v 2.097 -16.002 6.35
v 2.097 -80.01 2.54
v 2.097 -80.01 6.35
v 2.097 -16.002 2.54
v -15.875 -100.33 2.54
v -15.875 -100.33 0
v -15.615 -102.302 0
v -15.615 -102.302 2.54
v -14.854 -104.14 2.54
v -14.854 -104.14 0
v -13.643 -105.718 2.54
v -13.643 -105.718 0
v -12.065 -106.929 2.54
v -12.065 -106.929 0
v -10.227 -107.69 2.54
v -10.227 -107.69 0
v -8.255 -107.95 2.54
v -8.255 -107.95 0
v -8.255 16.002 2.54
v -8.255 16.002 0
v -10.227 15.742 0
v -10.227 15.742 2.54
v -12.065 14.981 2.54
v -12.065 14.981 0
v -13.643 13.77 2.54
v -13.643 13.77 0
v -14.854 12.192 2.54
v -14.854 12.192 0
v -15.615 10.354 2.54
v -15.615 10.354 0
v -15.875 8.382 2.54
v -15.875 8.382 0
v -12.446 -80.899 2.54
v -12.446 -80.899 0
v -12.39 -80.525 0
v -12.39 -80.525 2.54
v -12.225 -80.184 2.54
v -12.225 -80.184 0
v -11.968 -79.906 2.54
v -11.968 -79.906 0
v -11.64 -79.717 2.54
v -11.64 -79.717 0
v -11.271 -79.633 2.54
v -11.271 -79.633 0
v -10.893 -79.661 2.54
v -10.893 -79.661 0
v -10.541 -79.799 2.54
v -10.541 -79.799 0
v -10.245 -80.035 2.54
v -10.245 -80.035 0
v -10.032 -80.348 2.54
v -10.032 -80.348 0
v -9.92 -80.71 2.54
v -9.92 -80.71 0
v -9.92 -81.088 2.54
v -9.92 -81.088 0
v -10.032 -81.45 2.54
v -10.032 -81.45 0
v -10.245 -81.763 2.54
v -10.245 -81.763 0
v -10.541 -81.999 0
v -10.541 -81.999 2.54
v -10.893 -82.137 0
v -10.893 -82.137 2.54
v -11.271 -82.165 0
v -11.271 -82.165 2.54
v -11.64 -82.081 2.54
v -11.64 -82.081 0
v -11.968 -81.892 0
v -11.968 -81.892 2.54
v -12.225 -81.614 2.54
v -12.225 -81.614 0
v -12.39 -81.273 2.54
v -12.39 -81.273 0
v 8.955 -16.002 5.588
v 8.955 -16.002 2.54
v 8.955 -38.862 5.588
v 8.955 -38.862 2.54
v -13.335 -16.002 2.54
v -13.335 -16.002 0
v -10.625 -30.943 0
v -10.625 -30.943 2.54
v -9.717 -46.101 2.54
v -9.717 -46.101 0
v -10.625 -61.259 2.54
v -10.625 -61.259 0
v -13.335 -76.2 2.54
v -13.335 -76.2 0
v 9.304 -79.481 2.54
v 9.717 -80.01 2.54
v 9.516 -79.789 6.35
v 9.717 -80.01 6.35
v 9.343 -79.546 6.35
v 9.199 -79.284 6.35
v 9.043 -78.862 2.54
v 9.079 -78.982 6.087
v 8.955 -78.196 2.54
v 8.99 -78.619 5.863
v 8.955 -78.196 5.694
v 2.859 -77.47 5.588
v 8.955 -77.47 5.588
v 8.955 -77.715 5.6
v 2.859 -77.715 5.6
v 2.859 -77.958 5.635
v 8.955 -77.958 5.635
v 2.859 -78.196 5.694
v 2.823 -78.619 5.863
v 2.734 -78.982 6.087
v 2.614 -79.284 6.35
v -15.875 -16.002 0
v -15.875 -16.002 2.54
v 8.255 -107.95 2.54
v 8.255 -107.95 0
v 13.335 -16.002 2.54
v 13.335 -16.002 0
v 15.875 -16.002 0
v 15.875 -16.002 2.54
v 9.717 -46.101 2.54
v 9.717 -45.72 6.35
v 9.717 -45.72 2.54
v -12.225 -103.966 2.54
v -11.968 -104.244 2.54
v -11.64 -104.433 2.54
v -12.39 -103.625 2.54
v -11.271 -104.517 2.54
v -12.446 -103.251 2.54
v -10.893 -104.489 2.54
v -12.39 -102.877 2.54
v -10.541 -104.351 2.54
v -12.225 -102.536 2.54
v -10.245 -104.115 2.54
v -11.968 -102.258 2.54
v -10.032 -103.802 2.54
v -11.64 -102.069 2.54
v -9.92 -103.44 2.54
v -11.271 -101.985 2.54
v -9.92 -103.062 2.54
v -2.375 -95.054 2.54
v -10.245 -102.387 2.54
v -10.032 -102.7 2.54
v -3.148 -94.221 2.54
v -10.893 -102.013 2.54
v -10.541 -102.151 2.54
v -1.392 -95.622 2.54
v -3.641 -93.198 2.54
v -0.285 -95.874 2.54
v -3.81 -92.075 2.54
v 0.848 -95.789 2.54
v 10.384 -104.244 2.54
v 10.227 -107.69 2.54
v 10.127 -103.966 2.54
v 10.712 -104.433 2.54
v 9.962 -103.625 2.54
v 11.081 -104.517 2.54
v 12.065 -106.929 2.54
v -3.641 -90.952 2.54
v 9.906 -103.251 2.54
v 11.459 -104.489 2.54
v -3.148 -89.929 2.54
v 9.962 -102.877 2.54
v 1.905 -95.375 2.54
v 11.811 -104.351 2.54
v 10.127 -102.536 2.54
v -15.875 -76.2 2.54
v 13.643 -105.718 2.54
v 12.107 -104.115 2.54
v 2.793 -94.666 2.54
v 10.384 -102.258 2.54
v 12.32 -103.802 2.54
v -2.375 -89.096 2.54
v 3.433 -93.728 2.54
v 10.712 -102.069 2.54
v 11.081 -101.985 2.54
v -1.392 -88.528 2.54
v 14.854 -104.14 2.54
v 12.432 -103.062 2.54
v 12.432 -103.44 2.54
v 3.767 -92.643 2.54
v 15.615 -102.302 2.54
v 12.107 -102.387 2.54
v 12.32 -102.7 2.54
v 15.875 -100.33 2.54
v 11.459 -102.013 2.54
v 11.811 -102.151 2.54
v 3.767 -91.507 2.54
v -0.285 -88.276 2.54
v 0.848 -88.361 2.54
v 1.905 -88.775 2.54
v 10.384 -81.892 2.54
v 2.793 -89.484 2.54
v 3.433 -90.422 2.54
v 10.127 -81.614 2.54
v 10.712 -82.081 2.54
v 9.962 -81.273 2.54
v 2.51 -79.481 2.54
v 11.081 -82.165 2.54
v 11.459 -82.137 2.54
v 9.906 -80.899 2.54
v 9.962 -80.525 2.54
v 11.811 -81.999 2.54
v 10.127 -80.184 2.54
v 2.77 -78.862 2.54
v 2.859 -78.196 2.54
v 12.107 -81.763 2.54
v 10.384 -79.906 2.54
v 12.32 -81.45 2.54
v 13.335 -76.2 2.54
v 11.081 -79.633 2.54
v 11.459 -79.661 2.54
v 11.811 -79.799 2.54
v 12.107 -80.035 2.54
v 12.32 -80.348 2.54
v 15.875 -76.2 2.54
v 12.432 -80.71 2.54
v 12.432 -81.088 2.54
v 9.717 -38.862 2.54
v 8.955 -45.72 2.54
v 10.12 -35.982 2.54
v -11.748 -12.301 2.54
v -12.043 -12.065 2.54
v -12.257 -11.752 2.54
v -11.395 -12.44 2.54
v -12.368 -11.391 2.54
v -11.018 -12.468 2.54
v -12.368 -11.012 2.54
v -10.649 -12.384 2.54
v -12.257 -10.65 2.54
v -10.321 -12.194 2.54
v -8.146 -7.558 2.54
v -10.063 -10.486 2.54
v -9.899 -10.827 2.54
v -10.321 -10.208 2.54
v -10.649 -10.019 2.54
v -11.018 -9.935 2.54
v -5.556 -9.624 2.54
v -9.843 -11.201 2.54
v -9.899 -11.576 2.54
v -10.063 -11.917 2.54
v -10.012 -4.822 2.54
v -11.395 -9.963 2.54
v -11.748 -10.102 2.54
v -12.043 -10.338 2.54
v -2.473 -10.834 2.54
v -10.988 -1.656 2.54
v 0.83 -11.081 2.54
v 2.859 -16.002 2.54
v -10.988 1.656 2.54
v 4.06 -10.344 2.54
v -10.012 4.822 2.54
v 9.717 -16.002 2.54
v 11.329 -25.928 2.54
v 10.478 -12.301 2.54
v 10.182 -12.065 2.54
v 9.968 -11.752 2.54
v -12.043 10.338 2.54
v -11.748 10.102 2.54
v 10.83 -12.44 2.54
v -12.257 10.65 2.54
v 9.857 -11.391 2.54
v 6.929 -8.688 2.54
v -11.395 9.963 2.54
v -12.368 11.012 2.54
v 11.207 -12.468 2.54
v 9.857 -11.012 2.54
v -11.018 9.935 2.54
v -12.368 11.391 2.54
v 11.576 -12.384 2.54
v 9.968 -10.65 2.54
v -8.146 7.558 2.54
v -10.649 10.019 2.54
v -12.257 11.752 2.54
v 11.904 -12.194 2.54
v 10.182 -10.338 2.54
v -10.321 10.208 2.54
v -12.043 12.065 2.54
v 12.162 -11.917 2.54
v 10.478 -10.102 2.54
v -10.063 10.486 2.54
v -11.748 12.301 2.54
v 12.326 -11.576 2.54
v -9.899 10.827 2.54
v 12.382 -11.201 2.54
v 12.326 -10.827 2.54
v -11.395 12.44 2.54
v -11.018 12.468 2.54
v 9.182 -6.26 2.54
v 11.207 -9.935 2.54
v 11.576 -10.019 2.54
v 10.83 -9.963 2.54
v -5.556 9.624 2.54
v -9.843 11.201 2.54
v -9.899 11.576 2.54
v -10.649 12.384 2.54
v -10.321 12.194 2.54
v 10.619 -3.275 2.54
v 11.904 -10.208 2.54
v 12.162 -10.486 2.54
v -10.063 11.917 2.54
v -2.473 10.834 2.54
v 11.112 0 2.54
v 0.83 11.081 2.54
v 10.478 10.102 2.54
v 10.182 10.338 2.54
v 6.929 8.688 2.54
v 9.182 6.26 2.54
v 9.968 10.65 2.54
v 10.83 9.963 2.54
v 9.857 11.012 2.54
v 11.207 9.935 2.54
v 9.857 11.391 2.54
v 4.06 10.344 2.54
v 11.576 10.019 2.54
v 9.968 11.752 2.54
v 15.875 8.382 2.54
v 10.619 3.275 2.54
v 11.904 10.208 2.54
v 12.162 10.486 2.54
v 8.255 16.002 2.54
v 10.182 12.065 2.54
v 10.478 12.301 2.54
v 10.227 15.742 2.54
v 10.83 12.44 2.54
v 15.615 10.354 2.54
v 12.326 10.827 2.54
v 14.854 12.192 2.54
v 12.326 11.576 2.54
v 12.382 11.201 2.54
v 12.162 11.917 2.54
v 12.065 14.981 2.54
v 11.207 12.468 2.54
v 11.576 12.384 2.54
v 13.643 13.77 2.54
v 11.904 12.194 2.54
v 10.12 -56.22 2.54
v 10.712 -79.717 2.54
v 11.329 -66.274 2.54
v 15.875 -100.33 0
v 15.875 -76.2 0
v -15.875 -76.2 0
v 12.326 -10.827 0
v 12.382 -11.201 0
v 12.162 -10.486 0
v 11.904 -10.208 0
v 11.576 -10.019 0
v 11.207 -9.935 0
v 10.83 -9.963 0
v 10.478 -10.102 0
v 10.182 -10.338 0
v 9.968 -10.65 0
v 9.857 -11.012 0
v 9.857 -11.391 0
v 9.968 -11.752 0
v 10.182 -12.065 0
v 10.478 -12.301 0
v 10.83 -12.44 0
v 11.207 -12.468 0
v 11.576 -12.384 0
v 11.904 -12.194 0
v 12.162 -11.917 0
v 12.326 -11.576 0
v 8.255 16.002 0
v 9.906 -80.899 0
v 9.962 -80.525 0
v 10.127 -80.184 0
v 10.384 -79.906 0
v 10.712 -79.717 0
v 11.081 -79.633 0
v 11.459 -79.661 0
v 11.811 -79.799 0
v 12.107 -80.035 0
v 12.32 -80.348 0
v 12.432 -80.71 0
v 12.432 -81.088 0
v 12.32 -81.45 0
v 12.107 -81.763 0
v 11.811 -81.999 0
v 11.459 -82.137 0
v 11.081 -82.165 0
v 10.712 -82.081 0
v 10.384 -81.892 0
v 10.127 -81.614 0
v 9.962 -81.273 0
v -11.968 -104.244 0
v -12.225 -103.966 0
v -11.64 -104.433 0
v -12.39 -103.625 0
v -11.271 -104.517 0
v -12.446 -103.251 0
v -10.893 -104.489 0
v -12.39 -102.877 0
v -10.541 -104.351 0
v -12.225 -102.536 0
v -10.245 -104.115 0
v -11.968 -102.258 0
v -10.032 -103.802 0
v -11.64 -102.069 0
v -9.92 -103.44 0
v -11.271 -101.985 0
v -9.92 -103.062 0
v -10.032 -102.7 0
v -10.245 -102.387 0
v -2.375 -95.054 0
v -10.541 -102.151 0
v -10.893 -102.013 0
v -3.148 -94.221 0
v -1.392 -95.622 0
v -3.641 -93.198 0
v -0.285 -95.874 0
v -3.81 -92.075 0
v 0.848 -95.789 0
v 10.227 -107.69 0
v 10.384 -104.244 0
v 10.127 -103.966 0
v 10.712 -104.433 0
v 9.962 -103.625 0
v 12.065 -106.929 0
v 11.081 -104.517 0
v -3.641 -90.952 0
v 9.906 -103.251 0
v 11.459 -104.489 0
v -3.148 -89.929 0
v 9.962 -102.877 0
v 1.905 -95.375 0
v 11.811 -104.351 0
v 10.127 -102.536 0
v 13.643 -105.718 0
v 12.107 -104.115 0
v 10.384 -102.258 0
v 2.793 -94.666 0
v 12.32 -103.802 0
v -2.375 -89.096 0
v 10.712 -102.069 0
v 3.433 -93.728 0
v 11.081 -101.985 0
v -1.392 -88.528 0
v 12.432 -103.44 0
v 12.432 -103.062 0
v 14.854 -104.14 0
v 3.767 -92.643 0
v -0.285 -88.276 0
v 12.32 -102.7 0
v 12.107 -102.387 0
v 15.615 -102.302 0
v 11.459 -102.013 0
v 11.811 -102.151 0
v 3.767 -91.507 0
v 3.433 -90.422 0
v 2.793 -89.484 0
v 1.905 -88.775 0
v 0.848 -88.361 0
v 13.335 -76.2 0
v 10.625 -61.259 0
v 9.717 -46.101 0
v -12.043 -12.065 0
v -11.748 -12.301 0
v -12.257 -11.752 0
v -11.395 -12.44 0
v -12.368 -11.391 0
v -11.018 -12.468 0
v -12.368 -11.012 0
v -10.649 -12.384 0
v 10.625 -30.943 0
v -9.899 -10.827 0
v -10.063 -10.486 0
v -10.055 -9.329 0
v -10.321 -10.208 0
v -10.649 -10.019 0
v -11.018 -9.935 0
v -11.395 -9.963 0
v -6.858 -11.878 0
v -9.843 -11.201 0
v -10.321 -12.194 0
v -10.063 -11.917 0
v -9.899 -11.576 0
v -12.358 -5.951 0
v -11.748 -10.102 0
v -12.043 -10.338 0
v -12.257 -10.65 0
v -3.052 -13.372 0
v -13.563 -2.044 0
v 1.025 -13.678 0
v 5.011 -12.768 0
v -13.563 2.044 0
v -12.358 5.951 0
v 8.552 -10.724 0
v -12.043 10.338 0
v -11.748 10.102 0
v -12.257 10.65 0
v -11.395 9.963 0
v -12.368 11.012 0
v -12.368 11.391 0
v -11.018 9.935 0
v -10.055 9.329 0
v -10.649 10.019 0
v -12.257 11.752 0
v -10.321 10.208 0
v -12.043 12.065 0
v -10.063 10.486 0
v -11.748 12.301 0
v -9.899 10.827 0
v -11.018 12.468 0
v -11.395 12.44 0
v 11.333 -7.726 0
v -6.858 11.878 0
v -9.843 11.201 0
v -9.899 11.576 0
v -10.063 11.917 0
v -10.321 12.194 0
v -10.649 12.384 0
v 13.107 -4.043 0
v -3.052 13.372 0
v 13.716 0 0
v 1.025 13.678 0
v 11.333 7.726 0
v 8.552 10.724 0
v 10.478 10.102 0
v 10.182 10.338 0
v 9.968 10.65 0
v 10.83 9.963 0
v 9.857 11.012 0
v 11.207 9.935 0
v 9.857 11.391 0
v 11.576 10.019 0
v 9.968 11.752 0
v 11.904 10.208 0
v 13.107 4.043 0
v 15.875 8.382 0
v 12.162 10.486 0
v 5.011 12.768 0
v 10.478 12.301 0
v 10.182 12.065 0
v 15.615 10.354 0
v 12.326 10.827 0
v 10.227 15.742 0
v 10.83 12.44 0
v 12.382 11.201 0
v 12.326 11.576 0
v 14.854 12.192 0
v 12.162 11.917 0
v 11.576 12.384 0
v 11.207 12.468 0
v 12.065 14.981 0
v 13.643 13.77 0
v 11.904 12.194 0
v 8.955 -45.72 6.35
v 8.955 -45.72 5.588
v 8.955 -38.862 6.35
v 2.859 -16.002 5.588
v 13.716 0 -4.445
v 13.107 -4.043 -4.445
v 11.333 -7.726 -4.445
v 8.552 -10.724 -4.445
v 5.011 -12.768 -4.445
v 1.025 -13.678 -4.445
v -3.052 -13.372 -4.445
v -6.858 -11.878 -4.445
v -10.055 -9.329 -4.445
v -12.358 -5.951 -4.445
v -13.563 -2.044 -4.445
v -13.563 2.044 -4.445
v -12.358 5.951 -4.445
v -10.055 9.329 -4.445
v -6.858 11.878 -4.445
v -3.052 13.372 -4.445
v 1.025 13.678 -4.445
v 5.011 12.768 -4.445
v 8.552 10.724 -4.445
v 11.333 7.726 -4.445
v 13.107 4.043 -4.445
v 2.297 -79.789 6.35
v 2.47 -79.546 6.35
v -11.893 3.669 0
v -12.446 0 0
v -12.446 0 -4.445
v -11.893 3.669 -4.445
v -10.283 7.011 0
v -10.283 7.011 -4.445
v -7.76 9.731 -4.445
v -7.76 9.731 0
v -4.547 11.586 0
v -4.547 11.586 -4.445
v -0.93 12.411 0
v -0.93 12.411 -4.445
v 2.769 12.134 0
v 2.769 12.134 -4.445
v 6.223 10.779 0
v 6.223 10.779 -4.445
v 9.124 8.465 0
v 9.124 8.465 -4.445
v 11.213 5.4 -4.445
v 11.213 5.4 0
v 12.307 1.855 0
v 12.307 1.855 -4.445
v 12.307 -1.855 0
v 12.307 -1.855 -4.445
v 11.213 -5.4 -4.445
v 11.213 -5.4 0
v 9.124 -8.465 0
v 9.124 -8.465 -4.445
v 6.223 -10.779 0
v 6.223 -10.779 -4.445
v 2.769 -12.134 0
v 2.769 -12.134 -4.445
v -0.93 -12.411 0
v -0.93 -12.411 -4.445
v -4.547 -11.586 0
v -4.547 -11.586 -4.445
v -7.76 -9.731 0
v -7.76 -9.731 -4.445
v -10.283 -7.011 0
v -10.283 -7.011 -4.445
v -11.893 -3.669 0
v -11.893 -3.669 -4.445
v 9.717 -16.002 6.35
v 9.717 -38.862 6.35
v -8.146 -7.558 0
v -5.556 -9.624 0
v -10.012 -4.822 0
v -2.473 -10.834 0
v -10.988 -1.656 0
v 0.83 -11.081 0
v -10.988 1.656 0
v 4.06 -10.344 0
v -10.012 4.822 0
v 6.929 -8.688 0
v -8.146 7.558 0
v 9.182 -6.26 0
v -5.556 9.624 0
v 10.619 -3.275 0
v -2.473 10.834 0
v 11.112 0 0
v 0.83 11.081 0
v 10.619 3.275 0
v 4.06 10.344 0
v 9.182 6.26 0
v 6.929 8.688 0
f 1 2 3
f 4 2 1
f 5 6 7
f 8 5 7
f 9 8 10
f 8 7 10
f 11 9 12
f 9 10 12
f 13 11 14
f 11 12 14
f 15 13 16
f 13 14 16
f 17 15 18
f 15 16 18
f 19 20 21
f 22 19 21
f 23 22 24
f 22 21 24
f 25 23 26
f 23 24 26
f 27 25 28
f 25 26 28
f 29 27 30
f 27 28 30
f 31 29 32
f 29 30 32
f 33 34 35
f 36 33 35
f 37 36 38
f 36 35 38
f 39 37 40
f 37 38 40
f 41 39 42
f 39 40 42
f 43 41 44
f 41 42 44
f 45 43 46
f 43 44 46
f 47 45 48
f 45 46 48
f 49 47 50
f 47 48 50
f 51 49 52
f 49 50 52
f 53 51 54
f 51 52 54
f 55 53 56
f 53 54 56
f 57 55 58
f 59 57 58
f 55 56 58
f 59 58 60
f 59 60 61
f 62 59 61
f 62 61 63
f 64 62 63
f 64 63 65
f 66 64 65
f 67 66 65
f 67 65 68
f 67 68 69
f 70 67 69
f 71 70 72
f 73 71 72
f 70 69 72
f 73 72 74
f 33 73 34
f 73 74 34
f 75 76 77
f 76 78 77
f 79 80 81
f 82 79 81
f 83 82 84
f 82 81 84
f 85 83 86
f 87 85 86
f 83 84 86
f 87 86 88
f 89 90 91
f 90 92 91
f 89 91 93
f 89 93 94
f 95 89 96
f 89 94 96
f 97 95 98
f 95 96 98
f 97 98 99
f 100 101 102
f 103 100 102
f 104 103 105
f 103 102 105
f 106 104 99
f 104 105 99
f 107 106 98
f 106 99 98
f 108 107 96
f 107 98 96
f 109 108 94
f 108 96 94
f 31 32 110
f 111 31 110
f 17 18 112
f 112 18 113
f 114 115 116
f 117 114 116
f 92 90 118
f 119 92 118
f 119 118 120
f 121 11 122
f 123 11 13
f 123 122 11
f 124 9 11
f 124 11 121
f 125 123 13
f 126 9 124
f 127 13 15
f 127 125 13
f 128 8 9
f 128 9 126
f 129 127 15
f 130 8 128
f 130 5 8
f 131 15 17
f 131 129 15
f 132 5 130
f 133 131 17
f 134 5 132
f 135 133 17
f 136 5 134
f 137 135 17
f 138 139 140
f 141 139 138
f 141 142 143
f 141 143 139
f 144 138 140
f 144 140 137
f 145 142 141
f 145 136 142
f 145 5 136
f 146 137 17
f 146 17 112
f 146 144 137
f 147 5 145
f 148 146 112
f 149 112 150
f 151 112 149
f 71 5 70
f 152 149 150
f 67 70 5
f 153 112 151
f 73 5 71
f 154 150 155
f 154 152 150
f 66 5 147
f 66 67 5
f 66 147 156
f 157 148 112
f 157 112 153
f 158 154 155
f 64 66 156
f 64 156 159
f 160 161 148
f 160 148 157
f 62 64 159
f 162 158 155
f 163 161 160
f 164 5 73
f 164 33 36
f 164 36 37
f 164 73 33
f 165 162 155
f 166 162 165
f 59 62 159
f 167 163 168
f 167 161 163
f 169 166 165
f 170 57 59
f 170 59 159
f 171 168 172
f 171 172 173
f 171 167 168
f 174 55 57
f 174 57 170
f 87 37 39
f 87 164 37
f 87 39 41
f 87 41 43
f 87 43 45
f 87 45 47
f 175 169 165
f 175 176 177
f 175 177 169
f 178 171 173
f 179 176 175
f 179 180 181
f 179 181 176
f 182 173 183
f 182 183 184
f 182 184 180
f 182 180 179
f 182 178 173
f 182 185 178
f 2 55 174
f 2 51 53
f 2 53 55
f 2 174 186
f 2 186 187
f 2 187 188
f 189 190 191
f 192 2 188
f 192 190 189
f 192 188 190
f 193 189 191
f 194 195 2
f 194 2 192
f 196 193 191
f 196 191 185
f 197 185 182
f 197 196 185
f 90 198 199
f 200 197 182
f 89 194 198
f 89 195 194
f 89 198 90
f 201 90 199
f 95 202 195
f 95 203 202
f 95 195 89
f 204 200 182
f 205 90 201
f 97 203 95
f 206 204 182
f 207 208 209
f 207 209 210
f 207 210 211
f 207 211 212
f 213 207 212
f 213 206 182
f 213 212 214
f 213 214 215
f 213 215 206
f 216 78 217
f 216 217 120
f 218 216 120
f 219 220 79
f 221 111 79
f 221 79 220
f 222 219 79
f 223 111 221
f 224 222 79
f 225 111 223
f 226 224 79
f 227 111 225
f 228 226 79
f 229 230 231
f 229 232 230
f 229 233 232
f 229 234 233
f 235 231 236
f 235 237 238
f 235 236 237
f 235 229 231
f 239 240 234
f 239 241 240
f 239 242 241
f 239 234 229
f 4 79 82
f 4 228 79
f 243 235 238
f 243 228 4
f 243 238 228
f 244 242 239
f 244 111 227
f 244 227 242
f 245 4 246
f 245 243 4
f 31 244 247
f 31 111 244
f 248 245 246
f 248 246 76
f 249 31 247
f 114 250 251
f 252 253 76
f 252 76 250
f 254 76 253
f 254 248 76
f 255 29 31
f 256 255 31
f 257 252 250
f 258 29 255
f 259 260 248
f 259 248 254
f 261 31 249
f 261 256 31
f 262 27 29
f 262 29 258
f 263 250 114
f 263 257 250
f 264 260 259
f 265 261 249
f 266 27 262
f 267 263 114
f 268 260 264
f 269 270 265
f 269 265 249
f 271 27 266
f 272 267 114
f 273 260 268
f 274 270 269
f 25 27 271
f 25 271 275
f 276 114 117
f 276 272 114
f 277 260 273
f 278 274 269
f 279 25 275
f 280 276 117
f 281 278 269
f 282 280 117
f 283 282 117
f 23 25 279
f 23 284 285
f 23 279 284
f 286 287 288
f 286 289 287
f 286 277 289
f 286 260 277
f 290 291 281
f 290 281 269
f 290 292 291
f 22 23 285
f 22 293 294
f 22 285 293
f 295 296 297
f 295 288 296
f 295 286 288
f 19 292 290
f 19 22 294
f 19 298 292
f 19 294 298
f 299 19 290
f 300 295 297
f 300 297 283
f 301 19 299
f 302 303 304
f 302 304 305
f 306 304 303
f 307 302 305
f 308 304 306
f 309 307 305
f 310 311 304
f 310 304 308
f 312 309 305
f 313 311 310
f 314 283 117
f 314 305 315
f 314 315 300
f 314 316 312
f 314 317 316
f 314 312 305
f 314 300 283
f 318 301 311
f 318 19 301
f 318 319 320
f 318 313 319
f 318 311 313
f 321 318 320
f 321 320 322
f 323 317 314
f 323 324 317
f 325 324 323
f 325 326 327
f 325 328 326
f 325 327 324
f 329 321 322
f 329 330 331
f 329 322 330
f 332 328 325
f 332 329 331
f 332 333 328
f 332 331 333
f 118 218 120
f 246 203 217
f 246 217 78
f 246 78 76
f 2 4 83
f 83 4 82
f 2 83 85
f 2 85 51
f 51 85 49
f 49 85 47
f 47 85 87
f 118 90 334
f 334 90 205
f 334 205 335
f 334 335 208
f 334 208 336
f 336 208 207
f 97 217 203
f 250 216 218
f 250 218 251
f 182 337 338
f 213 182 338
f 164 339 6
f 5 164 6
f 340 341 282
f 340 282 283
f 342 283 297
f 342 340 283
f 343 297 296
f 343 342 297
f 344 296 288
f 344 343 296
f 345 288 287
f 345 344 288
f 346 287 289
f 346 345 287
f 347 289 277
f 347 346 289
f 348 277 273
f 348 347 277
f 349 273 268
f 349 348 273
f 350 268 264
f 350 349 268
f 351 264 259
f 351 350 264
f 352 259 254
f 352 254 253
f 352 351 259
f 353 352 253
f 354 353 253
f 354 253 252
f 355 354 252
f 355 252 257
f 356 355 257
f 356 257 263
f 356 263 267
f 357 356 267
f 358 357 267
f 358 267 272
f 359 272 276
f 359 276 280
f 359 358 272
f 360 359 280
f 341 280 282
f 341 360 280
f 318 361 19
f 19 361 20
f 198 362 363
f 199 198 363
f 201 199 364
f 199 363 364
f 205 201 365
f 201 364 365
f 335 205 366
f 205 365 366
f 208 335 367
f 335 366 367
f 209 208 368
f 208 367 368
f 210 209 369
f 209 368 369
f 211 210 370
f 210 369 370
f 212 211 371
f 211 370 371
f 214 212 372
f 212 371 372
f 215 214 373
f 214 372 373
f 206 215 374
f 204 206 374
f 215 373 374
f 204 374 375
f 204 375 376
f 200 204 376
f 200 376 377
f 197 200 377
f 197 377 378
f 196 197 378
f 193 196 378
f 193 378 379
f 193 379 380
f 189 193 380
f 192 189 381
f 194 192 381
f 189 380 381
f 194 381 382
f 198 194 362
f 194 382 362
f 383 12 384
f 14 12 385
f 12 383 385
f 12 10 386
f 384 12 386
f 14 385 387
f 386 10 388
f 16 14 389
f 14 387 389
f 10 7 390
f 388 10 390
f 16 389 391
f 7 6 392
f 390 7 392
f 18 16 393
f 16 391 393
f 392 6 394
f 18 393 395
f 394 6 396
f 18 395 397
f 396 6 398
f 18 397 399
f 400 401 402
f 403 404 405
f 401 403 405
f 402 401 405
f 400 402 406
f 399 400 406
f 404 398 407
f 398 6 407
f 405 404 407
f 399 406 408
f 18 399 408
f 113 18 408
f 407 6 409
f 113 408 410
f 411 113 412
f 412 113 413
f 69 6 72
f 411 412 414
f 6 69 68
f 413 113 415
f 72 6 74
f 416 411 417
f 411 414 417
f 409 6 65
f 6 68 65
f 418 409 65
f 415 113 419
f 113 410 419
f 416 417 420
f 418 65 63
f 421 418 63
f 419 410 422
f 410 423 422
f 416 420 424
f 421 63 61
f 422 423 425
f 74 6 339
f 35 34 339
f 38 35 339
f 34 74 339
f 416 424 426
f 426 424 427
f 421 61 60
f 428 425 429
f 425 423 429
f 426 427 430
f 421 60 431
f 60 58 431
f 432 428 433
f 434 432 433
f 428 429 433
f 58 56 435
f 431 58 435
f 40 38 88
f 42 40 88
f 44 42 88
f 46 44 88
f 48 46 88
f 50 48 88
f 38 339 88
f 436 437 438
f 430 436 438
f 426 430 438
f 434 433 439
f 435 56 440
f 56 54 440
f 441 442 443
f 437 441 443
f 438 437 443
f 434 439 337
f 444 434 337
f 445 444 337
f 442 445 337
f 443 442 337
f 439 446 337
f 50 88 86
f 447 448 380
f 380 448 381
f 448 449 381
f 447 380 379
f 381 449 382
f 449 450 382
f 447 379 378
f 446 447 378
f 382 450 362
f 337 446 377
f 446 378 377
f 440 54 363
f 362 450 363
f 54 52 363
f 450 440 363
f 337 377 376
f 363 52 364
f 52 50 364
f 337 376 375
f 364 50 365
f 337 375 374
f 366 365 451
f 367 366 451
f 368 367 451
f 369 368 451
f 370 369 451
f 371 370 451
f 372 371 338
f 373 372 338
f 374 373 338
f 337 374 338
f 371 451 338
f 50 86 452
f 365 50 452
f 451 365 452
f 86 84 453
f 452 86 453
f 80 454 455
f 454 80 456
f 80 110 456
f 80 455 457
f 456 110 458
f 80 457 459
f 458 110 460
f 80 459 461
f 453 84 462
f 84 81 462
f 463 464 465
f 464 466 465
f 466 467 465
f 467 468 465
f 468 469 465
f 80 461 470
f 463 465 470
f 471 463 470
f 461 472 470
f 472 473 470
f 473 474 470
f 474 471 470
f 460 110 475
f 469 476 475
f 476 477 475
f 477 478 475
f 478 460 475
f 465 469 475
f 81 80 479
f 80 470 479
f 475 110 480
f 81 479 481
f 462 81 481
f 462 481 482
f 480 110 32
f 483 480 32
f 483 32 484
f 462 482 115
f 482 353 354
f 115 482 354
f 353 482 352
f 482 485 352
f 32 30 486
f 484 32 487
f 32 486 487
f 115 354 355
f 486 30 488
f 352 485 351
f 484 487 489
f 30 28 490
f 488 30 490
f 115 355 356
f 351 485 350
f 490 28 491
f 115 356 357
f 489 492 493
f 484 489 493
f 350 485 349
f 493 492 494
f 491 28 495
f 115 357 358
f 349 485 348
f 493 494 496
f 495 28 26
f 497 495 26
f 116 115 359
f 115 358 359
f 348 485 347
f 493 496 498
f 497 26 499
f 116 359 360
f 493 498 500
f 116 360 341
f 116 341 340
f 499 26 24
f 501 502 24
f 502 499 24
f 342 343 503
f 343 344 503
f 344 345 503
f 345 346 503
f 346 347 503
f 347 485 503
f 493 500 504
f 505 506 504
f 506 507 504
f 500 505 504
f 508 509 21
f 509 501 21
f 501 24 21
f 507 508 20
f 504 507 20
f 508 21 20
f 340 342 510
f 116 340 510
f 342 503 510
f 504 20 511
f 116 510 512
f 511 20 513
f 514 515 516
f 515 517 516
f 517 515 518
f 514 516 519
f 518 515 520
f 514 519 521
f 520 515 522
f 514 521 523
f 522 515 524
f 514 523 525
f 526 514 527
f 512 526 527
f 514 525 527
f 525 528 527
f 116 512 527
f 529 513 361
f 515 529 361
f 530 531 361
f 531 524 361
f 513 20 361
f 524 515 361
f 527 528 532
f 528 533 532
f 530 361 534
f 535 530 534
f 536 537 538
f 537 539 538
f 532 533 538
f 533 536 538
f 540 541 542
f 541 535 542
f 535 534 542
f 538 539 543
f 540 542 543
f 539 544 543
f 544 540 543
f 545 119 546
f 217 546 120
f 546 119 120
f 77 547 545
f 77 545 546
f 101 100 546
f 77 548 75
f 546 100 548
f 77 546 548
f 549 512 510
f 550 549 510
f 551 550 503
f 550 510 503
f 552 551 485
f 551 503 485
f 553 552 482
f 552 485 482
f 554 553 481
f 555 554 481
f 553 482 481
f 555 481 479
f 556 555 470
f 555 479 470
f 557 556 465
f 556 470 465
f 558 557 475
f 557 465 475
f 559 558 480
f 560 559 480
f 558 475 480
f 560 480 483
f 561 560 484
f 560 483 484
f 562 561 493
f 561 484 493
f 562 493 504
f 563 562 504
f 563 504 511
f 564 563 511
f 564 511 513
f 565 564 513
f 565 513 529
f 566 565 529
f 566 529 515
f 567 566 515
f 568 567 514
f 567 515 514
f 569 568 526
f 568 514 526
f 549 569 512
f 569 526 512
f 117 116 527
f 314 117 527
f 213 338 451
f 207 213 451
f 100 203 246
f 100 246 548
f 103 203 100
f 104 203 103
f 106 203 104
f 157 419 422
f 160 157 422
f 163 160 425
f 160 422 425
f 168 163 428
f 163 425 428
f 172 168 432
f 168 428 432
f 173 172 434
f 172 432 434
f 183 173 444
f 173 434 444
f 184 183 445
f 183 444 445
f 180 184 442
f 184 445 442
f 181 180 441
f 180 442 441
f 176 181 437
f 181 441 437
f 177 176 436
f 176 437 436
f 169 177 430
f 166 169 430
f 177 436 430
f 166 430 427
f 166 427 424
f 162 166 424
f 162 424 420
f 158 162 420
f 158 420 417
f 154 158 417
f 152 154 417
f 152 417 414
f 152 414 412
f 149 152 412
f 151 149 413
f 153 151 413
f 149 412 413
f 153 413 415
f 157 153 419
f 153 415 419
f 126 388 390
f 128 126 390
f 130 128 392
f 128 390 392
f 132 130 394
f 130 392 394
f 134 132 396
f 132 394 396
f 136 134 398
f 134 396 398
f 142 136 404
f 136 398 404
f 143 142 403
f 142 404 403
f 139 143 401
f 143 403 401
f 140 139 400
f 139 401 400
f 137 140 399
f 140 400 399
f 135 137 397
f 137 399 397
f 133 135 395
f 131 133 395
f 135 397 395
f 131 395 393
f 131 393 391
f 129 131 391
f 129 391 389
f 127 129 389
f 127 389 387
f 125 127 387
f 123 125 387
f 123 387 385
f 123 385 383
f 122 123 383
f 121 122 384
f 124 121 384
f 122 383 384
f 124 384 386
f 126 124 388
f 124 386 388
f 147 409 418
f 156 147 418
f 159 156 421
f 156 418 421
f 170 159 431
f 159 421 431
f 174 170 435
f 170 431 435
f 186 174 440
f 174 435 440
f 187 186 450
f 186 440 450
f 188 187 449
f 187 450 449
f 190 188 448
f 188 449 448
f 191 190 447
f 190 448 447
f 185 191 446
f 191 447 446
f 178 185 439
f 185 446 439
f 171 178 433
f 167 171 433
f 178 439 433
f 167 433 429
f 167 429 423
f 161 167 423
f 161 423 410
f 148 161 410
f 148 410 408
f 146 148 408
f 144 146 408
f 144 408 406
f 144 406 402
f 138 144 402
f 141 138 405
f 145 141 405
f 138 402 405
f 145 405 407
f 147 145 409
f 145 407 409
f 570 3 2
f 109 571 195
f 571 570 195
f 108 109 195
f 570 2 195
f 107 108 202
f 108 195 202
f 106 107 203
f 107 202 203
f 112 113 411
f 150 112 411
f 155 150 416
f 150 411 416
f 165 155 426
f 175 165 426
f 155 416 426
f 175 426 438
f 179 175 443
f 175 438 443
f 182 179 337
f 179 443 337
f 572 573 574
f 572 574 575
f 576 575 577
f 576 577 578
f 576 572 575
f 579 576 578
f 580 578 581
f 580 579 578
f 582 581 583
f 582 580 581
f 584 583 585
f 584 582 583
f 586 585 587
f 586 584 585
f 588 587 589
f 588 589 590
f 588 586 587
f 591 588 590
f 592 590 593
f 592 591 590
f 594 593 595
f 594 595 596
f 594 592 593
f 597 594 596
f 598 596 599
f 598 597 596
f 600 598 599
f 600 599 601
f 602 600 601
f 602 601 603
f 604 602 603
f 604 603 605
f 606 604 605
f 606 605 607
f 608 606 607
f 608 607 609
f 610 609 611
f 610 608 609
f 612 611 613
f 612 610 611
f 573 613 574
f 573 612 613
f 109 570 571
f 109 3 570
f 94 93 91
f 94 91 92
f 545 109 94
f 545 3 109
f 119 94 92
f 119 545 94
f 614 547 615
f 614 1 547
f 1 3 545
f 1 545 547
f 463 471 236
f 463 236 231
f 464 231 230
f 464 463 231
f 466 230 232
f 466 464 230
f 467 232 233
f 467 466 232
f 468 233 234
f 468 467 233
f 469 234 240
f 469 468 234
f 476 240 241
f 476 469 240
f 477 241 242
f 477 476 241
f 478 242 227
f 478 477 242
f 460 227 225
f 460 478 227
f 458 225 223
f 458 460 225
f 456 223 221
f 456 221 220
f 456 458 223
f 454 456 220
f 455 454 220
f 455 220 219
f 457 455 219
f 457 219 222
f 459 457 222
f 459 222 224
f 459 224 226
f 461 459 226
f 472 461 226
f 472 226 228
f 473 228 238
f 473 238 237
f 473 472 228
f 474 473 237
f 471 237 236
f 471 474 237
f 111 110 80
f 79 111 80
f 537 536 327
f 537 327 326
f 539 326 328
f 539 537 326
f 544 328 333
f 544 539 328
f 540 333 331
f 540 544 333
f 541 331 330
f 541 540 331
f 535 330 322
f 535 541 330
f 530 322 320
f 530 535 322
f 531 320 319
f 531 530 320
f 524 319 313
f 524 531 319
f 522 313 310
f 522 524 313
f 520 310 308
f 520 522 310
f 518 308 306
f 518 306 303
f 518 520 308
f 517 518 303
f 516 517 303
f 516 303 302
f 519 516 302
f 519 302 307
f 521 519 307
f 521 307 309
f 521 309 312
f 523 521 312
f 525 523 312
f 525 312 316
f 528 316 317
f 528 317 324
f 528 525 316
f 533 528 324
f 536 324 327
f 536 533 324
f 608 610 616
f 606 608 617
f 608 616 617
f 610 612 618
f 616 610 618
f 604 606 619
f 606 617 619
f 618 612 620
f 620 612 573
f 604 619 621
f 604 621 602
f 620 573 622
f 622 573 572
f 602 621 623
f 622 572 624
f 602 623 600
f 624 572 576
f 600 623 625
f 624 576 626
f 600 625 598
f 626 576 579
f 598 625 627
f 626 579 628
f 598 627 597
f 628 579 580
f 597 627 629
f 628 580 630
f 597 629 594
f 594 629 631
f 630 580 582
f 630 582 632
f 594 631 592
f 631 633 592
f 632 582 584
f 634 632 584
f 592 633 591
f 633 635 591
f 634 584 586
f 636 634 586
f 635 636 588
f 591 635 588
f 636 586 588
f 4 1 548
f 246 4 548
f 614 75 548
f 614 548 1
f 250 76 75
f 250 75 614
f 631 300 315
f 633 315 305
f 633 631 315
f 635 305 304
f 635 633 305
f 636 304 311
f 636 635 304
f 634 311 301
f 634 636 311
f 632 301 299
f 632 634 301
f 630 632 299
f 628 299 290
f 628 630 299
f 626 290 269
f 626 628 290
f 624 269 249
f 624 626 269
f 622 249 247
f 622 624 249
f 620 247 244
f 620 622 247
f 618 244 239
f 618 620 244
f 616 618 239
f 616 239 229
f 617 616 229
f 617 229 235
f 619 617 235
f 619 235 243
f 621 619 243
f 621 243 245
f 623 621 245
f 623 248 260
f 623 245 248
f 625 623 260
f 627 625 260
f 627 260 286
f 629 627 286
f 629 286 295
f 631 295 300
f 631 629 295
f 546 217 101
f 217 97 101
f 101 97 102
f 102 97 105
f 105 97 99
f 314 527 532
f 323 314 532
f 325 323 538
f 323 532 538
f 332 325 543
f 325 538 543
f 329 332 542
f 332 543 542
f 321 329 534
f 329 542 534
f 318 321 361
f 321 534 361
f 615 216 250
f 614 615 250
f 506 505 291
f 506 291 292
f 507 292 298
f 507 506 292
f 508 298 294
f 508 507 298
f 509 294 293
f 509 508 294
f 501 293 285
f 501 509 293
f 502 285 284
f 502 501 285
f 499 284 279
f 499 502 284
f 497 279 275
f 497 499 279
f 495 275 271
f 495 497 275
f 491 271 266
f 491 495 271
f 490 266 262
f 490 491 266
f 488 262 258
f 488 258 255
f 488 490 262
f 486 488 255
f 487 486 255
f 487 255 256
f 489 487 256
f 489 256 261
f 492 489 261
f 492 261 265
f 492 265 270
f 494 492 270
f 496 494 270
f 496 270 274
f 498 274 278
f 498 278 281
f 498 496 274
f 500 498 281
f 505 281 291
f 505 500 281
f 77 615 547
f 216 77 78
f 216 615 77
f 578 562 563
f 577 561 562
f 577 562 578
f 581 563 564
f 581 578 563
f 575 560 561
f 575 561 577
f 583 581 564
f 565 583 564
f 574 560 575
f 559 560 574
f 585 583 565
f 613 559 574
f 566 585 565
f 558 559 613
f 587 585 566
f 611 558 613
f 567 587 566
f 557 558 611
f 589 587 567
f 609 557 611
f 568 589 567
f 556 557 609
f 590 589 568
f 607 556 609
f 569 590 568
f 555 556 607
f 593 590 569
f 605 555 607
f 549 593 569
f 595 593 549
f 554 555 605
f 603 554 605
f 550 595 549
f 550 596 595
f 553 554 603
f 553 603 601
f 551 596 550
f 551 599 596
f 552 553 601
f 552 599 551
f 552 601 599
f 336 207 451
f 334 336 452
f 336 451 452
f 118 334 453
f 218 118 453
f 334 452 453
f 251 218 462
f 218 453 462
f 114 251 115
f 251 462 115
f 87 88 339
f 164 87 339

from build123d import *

# Parameters (mm, degrees)
SKETCH1_R           = 11.1125
SKETCH1_R_2         = 1.27
BOSS_EXTRUDE1_DEPTH = 2.54
SKETCH2_R           = 1.27
SKETCH2_R_2         = 3.81
CUT_EXTRUDE1_DEPTH  = 2.54
SKETCH3_R           = 13.716
SKETCH3_R_2         = 12.446
BOSS_EXTRUDE2_DEPTH = 4.445
SKETCH4_W           = 7.62
SKETCH4_H           = 64.008
SKETCH4_W_2         = 6.096
SKETCH4_H_2         = 62.484
EXTRUDE_THIN1_DEPTH = 3.81
SKETCH5_W           = 6.096
SKETCH5_H           = 3.81
CUT_EXTRUDE2_DEPTH  = 76.2
SKETCH6_W           = 7.62
SKETCH6_H           = 64.008
BOSS_EXTRUDE3_DEPTH = 0.762
FILLET1_R           = 2.54
SKETCH7_W           = 3.81
SKETCH7_H           = 6.858
CUT_EXTRUDE3_DEPTH  = 0.762


with BuildPart() as part:
    # Sketch1 → Boss-Extrude1 (new body)
    with BuildSketch(Plane.XY):
        with BuildLine():
            Line((-13.335, -76.2), (-15.875, -76.2))
            Line((-15.875, -76.2), (-15.875, -100.33))
            ThreePointArc((-15.875, -100.33), (-13.643153673, -105.718153673), (-8.255, -107.95))
            Line((-8.255, -107.95), (8.255, -107.95))
            ThreePointArc((8.255, -107.95), (13.643153673, -105.718153673), (15.875, -100.33))
            Line((15.875, -100.33), (15.875, -76.2))
            Line((15.875, -76.2), (13.335, -76.2))
            ThreePointArc((13.335, -76.2), (9.716725547, -46.101), (13.335, -16.002))
            Line((13.335, -16.002), (15.875, -16.002))
            Line((15.875, -16.002), (15.875, 8.382))
            ThreePointArc((15.875, 8.382), (13.643153673, 13.770153673), (8.255, 16.002))
            Line((8.255, 16.002), (-8.255, 16.002))
            ThreePointArc((-8.255, 16.002), (-13.643153673, 13.770153673), (-15.875, 8.382))
            Line((-15.875, 8.382), (-15.875, -16.002))
            Line((-15.875, -16.002), (-13.335, -16.002))
            ThreePointArc((-13.335, -16.002), (-9.716725547, -46.101), (-13.335, -76.2))
        make_face()
        Circle(SKETCH1_R, mode=Mode.SUBTRACT)
        with Locations((11.1125, 11.2014)):
            Circle(SKETCH1_R_2, mode=Mode.SUBTRACT)
        with Locations((11.1125, -11.2014)):
            Circle(SKETCH1_R_2, mode=Mode.SUBTRACT)
        with Locations((-11.1125, -11.2014)):
            Circle(SKETCH1_R_2, mode=Mode.SUBTRACT)
        with Locations((-11.1125, 11.2014)):
            Circle(SKETCH1_R_2, mode=Mode.SUBTRACT)
    extrude(amount=BOSS_EXTRUDE1_DEPTH)

    # Sketch2 → Cut-Extrude1 (cut)
    with BuildSketch(Plane(origin=(0, 0, 0), x_dir=(-1, 0, 0), z_dir=(0, 0, -1))):
        with Locations((-11.176, -80.899)):
            Circle(SKETCH2_R)
        with Locations((11.176, -80.899)):
            Circle(SKETCH2_R)
        with Locations((11.176, -103.251)):
            Circle(SKETCH2_R)
        with Locations((-11.176, -103.251)):
            Circle(SKETCH2_R)
        with Locations((0, -92.075)):
            Circle(SKETCH2_R_2)
    extrude(amount=-CUT_EXTRUDE1_DEPTH, mode=Mode.SUBTRACT)

    # Sketch3 → Boss-Extrude2 (add)
    with BuildSketch(Plane(origin=(0, 0, 0), x_dir=(-1, 0, 0), z_dir=(0, 0, -1))):
        with Locations(Location((0, 0, 0), (0, 0, 180))):
            Circle(SKETCH3_R)
        Circle(SKETCH3_R_2, mode=Mode.SUBTRACT)
    extrude(amount=BOSS_EXTRUDE2_DEPTH)

    # Sketch4 → Extrude-Thin1 (add)
    with BuildSketch(Plane.XY.offset(2.54)):
        with Locations((5.906725547, -48.006)):
            Rectangle(SKETCH4_W, SKETCH4_H)
        with Locations((5.906725547, -48.006)):
            Rectangle(SKETCH4_W_2, SKETCH4_H_2, mode=Mode.SUBTRACT)
    extrude(amount=EXTRUDE_THIN1_DEPTH)

    # Sketch5 → Cut-Extrude2 (cut)
    with BuildSketch(Plane.XZ.offset(80.01)):
        with Locations((5.906725547, 4.445)):
            Rectangle(SKETCH5_W, SKETCH5_H)
    extrude(amount=-CUT_EXTRUDE2_DEPTH, mode=Mode.SUBTRACT)

    # Sketch6 → Boss-Extrude3 (add)
    with BuildSketch(Plane.XY.offset(6.35)):
        with Locations((5.906725547, -48.006)):
            Rectangle(SKETCH6_W, SKETCH6_H)
    extrude(amount=-BOSS_EXTRUDE3_DEPTH)

    # Fillet1
    # the kernel refuses this fillet: 2.54 mm, written as the material it takes off along each edge
    with BuildSketch(Plane(origin=(8.954725547, -80.01, 5.588), x_dir=(0, 1, 0), z_dir=(0, 0, -1)), Plane(origin=(2.858725547, -80.01, 2.54), x_dir=(0, 1, 0), z_dir=(0, 0, 1))) as fillet1_piece_1:
        with BuildLine():
            CenterArc((1.813922821, 2.54), FILLET1_R, 224.427004001, 45.572995999)
            Line((0, 0.762), (0, 0))
            Line((0, 0), (1.813922821, 0))
        make_face()
    extrude(amount=3.048, mode=Mode.SUBTRACT)
    with BuildSketch(Plane(origin=(8.954725547, -80.01, 5.588), x_dir=(0, 1, 0), z_dir=(-1, 0, 0))) as fillet1_piece_2:
        with BuildLine():
            CenterArc((FILLET1_R, -FILLET1_R), FILLET1_R, 90, 90)
            Line((0, -FILLET1_R), (0, 0))
            Line((0, 0), (FILLET1_R, 0))
        make_face()
    extrude(amount=6.096, mode=Mode.SUBTRACT)
    with BuildSketch(Plane(origin=(15.304725547, -80.01, 5.588), x_dir=(0, 1, 0), z_dir=(-1, 0, 0))) as fillet1_piece_3a_section:
        with BuildLine():
            CenterArc((FILLET1_R, -FILLET1_R), FILLET1_R, 90, 90)
            Line((0, -FILLET1_R), (0, 0))
            Line((0, 0), (FILLET1_R, 0))
        make_face()
    fillet1_piece_3a = extrude(amount=12.446, mode=Mode.PRIVATE)
    fillet1_piece_3a = split(fillet1_piece_3a, bisect_by=Plane(origin=(15.304725547, -80.01, 6.35), z_dir=(0, 0, -1)), keep=Keep.TOP, mode=Mode.PRIVATE)
    fillet1_piece_3a = split(fillet1_piece_3a, bisect_by=Plane(origin=(8.954725547, -80.01, 5.588), z_dir=(1, 0, 0)), keep=Keep.TOP, mode=Mode.PRIVATE)
    fillet1_piece_3a = split(fillet1_piece_3a, bisect_by=Plane(origin=(9.716725547, -80.01, 5.588), z_dir=(-1, 0, 0)), keep=Keep.TOP, mode=Mode.PRIVATE)
    with BuildSketch(Plane(origin=(8.954725547, -80.01, 10.122807052), x_dir=(0, 1, 0), z_dir=(0, 0, -1))) as fillet1_piece_3b_section:
        with BuildLine():
            CenterArc((1.813922821, 2.54), FILLET1_R, 224.427004001, 45.572995999)
            Line((0, 0.762), (0, 0))
            Line((0, 0), (1.813922821, 0))
        make_face()
    fillet1_piece_3b = extrude(amount=7.582807052, mode=Mode.PRIVATE)
    fillet1_piece_3b = split(fillet1_piece_3b, bisect_by=Plane(origin=(8.954725547, -80.01, 6.35), z_dir=(0, 0, -1)), keep=Keep.TOP, mode=Mode.PRIVATE)
    fillet1_piece_3b = split(fillet1_piece_3b, bisect_by=Plane(origin=(8.954725547, -80.01, 5.588), z_dir=(0, 0, 1)), keep=Keep.TOP, mode=Mode.PRIVATE)
    fillet1_piece_3 = fillet1_piece_3a & fillet1_piece_3b
    add(fillet1_piece_3, mode=Mode.SUBTRACT)
    with BuildSketch(Plane(origin=(2.858725547, -80.01, 2.54), x_dir=(0, 1, 0), z_dir=(0, 0, 1))) as fillet1_piece_4a_section:
        with BuildLine():
            CenterArc((1.813922821, 2.54), FILLET1_R, 224.427004001, 45.572995999)
            Line((0, 0.762), (0, 0))
            Line((0, 0), (1.813922821, 0))
        make_face()
    fillet1_piece_4a = extrude(amount=7.582807052, mode=Mode.PRIVATE)
    fillet1_piece_4a = split(fillet1_piece_4a, bisect_by=Plane(origin=(2.858725547, -80.01, 6.35), z_dir=(0, 0, -1)), keep=Keep.TOP, mode=Mode.PRIVATE)
    fillet1_piece_4a = split(fillet1_piece_4a, bisect_by=Plane(origin=(2.858725547, -80.01, 5.588), z_dir=(0, 0, 1)), keep=Keep.TOP, mode=Mode.PRIVATE)
    with BuildSketch(Plane(origin=(8.954725547, -80.01, 5.588), x_dir=(0, 1, 0), z_dir=(-1, 0, 0))) as fillet1_piece_4b_section:
        with BuildLine():
            CenterArc((FILLET1_R, -FILLET1_R), FILLET1_R, 90, 90)
            Line((0, -FILLET1_R), (0, 0))
            Line((0, 0), (FILLET1_R, 0))
        make_face()
    fillet1_piece_4b = extrude(amount=12.446, mode=Mode.PRIVATE)
    fillet1_piece_4b = split(fillet1_piece_4b, bisect_by=Plane(origin=(2.096725547, -80.01, 5.588), z_dir=(1, 0, 0)), keep=Keep.TOP, mode=Mode.PRIVATE)
    fillet1_piece_4b = split(fillet1_piece_4b, bisect_by=Plane(origin=(8.954725547, -80.01, 6.35), z_dir=(0, 0, -1)), keep=Keep.TOP, mode=Mode.PRIVATE)
    fillet1_piece_4b = split(fillet1_piece_4b, bisect_by=Plane(origin=(2.858725547, -80.01, 5.588), z_dir=(-1, 0, 0)), keep=Keep.TOP, mode=Mode.PRIVATE)
    fillet1_piece_4 = fillet1_piece_4a & fillet1_piece_4b
    add(fillet1_piece_4, mode=Mode.SUBTRACT)

    # Sketch7 → Cut-Extrude3 (cut)
    with BuildSketch(Plane(origin=(9.716725547, 0, 0), x_dir=(0, 0, -1), z_dir=(1, 0, 0))):
        with Locations((-4.445, -42.291)):
            Rectangle(SKETCH7_W, SKETCH7_H)
    extrude(amount=-CUT_EXTRUDE3_DEPTH, mode=Mode.SUBTRACT)


solid = part.part
